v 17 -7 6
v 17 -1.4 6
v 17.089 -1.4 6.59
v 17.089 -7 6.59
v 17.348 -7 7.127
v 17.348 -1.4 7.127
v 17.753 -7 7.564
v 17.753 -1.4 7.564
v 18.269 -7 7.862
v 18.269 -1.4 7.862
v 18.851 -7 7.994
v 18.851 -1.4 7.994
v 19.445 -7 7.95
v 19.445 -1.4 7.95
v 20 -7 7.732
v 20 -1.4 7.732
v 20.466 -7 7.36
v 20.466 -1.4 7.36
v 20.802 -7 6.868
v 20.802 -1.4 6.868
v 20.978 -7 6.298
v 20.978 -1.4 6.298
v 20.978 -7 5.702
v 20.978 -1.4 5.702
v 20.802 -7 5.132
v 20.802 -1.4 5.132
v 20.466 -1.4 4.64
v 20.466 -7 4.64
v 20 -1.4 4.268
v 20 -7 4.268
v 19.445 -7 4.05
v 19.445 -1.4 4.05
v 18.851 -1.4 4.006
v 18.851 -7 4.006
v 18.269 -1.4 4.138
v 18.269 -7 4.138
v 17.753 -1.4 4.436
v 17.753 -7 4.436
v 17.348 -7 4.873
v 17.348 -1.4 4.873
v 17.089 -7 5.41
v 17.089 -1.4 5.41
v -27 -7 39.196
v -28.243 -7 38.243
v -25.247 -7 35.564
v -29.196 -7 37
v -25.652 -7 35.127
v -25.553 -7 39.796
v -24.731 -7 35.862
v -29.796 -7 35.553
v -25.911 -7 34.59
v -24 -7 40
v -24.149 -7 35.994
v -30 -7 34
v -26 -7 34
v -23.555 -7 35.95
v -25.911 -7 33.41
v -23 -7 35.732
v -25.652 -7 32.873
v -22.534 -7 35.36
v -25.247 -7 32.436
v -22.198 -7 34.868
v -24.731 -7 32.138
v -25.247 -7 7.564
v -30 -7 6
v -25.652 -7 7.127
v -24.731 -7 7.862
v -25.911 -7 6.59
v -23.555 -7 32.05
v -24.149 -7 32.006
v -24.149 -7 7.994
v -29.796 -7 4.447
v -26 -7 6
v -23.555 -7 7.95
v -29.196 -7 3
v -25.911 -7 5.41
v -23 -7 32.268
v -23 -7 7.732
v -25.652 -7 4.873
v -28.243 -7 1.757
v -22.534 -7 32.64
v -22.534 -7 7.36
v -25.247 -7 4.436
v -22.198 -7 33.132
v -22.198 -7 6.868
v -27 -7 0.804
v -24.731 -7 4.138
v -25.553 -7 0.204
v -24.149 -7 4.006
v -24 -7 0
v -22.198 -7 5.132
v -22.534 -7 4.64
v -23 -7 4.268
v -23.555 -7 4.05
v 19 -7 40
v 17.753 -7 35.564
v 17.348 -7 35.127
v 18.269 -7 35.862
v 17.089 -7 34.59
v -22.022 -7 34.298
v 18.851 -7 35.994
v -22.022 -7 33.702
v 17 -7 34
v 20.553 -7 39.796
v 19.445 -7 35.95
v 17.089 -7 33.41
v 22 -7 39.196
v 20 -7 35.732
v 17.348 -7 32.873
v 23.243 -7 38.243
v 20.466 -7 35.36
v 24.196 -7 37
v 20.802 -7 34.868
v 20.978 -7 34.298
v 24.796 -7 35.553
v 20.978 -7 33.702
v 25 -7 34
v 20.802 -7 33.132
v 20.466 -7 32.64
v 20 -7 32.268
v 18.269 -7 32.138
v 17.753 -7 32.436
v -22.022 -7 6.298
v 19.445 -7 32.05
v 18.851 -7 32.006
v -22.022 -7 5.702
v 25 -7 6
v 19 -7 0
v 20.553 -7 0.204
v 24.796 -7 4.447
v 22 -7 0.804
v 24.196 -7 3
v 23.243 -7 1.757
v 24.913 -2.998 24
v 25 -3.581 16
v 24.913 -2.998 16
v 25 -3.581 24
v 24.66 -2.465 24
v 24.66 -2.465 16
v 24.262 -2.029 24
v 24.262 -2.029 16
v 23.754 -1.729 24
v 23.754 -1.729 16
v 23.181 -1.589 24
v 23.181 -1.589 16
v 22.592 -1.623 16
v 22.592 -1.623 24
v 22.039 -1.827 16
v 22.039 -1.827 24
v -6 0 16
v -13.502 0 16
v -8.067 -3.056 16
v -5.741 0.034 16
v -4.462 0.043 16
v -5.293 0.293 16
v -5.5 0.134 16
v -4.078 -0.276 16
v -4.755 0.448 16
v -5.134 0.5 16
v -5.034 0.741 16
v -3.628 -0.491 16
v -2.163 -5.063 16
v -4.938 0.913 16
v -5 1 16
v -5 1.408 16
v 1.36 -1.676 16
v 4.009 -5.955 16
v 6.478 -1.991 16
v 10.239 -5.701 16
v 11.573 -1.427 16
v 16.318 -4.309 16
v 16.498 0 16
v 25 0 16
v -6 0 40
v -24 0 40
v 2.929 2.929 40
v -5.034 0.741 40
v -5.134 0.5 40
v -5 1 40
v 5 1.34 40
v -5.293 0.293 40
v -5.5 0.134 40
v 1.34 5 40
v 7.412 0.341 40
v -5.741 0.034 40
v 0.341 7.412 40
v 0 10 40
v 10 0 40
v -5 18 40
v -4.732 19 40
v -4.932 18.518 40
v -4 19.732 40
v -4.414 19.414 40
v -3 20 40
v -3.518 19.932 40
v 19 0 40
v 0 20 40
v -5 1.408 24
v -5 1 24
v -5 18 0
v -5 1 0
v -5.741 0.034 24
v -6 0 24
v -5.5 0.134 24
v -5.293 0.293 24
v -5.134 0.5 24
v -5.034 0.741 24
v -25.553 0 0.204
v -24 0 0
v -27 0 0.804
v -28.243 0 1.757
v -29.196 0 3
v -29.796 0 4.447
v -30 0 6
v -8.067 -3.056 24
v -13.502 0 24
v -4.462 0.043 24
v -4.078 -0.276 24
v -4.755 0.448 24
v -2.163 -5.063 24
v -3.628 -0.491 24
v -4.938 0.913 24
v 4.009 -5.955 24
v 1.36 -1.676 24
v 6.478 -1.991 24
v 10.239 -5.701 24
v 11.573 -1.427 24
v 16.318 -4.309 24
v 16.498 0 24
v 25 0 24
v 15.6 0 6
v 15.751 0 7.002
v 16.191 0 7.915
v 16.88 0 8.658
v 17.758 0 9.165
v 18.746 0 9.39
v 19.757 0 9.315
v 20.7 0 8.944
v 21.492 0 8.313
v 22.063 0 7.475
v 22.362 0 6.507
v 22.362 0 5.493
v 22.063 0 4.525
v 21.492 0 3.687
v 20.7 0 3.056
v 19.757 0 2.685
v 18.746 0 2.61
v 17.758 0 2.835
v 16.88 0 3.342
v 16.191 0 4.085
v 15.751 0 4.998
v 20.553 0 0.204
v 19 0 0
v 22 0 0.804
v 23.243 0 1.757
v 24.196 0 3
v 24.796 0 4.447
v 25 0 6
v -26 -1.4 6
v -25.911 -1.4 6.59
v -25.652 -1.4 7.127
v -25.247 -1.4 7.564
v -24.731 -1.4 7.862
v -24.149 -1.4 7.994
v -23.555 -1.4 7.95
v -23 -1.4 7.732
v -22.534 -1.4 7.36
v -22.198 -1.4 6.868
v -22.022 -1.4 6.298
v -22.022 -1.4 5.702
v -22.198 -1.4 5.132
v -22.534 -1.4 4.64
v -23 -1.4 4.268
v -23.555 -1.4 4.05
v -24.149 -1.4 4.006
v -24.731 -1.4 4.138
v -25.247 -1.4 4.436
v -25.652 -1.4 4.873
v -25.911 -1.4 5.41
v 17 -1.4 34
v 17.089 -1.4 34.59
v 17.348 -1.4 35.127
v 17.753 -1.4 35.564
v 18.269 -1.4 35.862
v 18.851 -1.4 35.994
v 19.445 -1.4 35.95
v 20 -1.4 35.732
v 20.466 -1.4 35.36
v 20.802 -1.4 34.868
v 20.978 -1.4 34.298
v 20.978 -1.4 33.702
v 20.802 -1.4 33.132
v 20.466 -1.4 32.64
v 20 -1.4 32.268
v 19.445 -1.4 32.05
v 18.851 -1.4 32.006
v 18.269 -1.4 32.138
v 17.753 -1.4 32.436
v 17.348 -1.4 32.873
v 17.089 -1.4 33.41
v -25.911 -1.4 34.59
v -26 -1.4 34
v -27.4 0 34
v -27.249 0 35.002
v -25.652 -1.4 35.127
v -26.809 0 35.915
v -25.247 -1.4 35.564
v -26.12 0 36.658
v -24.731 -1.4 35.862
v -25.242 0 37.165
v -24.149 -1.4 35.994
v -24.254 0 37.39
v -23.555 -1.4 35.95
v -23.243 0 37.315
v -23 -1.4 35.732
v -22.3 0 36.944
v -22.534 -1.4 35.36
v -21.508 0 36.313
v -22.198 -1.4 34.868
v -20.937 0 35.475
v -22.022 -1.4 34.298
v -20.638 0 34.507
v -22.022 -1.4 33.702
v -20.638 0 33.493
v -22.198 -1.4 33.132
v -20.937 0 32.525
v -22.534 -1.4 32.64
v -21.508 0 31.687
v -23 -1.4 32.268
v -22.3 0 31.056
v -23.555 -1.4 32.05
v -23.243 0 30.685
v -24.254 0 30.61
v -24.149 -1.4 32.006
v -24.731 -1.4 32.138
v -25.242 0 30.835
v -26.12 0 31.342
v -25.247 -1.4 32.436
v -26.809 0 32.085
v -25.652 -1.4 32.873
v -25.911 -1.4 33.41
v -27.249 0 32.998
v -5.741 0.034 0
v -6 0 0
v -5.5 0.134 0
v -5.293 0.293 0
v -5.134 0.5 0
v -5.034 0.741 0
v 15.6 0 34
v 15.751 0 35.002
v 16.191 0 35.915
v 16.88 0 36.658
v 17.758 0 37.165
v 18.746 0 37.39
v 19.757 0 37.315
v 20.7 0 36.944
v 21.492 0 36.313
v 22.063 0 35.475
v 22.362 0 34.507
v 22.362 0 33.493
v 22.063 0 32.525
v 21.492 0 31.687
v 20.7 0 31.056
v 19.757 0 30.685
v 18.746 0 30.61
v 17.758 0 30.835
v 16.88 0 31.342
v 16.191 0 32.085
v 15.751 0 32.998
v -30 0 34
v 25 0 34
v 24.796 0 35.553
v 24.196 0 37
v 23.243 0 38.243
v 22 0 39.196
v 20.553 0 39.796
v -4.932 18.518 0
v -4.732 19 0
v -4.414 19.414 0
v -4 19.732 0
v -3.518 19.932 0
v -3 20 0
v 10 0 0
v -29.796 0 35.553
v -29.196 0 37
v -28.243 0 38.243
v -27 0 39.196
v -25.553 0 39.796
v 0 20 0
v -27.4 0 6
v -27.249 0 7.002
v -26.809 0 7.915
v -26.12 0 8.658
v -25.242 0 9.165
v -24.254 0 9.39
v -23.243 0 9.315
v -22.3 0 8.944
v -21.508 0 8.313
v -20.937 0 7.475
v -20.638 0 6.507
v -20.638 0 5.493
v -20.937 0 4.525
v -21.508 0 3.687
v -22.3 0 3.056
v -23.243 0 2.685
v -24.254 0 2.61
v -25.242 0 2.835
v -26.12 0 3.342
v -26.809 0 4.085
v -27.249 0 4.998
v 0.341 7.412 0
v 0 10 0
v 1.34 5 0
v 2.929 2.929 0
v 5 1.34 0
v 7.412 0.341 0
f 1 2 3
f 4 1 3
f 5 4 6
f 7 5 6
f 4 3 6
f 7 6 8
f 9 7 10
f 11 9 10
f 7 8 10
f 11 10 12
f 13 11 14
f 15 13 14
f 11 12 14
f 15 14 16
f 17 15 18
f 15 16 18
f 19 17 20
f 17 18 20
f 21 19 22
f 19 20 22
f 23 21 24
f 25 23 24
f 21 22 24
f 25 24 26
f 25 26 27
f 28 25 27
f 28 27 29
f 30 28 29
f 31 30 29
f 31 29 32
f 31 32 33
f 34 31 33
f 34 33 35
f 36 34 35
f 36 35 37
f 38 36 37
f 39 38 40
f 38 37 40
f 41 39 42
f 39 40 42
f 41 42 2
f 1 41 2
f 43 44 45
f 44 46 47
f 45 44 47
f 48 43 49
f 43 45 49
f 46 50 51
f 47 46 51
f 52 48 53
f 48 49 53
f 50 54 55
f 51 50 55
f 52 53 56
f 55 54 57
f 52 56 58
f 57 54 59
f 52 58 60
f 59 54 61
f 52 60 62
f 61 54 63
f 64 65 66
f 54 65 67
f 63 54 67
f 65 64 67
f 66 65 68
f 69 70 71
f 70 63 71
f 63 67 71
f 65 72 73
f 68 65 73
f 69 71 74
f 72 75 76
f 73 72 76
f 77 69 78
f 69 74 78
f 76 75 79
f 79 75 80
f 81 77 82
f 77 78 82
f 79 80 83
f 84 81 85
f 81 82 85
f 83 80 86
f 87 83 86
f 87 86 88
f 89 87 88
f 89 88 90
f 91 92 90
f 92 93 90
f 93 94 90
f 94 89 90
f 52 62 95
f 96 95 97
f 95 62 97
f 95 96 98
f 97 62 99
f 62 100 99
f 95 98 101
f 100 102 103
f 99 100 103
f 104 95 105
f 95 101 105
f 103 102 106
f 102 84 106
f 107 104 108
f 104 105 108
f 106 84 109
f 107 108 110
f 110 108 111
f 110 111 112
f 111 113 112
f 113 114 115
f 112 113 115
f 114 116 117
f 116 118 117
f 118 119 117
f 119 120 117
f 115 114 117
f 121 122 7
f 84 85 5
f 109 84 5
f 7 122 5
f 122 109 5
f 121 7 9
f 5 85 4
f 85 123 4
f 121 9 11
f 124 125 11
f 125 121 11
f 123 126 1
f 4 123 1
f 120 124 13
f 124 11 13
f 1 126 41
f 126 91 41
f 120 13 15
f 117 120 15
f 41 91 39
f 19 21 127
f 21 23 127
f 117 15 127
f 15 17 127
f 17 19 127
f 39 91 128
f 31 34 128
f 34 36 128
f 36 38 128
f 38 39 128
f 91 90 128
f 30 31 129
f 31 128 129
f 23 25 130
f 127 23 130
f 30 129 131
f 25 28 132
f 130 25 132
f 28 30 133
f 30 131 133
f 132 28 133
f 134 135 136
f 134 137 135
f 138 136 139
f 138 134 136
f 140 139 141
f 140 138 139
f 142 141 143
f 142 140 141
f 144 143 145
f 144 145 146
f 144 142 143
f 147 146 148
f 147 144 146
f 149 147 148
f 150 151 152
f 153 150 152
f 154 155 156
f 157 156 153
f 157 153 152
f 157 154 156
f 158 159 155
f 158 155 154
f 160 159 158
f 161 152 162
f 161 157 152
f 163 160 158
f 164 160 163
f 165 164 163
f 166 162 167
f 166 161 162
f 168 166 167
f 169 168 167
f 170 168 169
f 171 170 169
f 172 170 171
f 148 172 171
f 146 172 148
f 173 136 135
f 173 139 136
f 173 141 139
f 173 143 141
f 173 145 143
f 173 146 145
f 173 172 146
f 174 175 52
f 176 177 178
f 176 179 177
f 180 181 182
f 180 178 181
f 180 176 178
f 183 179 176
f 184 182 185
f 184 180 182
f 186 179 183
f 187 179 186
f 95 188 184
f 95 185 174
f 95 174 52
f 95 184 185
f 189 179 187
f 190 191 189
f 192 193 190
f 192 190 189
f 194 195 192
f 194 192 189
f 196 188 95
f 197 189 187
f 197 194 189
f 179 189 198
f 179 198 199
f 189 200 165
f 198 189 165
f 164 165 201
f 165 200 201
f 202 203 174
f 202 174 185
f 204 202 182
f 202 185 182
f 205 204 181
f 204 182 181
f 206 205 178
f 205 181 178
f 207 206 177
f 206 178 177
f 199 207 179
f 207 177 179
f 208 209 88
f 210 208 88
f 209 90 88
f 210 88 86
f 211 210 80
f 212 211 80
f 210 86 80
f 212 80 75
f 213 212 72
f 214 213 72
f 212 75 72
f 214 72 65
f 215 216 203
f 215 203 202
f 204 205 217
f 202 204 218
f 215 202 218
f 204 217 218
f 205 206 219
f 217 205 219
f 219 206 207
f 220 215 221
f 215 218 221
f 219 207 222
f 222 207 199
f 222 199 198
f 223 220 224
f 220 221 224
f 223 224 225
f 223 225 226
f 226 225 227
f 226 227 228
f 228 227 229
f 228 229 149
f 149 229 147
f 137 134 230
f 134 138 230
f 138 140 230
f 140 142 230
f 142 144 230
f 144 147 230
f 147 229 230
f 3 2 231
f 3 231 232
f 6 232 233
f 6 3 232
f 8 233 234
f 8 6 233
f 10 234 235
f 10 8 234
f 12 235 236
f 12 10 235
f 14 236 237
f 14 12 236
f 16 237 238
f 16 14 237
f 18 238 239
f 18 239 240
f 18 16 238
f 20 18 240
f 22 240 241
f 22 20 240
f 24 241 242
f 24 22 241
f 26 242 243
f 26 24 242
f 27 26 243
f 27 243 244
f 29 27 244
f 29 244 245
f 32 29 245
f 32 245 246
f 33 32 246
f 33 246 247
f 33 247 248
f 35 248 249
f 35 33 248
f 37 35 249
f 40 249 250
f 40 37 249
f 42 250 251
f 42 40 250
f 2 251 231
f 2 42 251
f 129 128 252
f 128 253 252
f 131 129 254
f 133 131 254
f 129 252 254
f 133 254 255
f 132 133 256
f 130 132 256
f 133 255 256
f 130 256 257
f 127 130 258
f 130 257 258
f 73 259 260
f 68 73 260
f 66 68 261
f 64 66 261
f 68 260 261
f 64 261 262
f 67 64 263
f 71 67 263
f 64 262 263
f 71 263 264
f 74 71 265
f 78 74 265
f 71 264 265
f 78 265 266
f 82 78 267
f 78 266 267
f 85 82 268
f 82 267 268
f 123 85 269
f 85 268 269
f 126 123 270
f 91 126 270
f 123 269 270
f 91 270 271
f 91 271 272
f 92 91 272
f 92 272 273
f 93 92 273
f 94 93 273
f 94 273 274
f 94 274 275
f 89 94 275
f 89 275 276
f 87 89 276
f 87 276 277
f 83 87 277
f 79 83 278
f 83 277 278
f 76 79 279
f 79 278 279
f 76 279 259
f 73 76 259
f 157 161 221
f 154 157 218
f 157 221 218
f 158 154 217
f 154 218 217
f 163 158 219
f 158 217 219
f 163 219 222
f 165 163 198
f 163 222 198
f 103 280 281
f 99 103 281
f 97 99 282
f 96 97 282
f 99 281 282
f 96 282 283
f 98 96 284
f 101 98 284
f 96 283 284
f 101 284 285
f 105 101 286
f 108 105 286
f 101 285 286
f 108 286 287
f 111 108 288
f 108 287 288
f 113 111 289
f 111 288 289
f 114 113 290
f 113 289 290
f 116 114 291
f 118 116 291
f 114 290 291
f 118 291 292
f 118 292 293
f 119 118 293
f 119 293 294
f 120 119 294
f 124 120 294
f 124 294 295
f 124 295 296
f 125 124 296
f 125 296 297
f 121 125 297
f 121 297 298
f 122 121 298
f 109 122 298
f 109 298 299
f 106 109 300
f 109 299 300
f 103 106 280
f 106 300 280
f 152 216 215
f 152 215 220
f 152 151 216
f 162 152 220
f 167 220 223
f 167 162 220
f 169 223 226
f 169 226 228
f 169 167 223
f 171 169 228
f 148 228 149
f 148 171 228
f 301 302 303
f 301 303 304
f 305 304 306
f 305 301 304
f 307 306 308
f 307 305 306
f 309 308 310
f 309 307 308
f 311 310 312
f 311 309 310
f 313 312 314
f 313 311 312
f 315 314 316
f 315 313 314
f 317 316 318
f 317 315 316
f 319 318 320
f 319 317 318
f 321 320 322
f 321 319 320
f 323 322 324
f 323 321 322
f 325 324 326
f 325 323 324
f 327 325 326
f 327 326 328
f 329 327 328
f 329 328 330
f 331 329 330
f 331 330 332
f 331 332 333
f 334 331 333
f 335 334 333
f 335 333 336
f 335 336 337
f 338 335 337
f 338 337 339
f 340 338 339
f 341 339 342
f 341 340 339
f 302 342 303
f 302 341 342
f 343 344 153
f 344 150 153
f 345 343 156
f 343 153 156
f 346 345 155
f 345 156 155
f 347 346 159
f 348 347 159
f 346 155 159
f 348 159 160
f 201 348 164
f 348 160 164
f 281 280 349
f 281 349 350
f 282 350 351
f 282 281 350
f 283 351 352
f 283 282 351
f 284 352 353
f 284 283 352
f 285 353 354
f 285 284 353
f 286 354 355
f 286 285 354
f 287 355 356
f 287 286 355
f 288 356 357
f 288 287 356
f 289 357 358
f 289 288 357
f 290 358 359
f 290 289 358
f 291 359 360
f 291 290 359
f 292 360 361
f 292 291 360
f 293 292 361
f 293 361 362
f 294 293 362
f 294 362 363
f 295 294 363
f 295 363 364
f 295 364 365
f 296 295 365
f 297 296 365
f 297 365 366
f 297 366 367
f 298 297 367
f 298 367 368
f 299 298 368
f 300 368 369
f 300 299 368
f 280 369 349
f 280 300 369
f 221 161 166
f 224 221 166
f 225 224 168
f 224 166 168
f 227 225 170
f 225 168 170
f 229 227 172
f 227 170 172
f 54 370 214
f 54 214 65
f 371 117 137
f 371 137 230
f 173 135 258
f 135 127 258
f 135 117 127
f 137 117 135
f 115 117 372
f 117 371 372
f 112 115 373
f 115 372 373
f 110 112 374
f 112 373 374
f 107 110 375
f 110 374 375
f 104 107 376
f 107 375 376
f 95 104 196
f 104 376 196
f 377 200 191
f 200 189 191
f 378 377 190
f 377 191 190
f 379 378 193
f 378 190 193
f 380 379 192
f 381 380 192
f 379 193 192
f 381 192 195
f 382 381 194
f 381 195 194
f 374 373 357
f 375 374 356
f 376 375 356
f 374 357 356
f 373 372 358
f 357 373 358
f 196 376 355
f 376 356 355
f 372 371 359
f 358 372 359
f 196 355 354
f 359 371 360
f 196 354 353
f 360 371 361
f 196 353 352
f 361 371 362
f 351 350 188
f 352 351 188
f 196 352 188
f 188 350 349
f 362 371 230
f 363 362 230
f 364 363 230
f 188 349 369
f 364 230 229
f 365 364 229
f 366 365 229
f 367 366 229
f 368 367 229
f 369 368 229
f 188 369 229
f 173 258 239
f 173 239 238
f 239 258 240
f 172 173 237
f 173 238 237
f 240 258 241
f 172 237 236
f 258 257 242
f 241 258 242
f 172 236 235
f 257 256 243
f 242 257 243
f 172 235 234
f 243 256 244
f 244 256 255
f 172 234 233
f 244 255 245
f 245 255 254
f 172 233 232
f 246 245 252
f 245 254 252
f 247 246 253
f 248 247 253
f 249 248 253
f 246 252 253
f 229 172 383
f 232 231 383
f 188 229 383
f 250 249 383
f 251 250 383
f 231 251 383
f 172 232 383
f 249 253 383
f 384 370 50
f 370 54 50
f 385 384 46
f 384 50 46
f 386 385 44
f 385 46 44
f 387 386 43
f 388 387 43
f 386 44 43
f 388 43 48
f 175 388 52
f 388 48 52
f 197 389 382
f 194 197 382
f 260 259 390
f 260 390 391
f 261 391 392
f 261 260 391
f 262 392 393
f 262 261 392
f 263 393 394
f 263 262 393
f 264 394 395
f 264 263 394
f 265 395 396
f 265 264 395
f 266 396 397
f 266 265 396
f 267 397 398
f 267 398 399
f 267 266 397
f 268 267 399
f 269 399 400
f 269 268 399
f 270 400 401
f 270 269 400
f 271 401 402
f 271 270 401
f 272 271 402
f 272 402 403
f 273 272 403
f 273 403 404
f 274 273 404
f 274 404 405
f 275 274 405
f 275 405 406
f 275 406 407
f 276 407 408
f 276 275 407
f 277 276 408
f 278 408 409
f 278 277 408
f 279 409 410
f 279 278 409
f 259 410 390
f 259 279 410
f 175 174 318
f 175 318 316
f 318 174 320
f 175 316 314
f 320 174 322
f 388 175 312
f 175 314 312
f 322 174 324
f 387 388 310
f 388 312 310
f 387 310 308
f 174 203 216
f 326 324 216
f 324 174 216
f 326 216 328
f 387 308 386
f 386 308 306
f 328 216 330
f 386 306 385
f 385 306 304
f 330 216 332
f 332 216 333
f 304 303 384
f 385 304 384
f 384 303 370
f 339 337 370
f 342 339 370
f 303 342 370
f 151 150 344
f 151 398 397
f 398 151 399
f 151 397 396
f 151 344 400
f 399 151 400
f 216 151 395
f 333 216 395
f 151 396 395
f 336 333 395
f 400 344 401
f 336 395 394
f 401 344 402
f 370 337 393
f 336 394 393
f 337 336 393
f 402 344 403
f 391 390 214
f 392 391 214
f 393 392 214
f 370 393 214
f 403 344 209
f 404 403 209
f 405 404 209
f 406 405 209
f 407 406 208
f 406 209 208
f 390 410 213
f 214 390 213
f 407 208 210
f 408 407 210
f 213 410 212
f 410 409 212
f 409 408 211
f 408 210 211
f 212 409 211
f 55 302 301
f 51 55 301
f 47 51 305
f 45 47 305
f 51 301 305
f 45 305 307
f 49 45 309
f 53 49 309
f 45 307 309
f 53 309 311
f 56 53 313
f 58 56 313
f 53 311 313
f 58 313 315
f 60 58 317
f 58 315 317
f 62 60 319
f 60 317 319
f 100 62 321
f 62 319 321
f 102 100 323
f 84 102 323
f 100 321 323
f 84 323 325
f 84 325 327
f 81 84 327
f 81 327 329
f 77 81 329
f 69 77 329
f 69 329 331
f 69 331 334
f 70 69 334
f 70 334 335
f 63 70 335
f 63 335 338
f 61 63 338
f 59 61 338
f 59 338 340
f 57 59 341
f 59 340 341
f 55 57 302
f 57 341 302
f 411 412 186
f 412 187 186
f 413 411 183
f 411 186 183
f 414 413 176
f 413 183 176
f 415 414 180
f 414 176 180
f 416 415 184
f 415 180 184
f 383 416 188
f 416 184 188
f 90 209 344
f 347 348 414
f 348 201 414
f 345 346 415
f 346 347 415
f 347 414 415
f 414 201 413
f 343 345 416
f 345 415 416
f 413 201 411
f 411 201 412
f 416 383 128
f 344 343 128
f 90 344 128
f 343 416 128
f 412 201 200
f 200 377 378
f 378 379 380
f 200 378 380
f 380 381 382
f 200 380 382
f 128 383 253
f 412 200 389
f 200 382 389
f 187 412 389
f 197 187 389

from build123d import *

# Parameters (mm, degrees)
BOSS_EXTRUDE1_DEPTH     = 40
CUT_EXTRUDE1_DEPTH      = 4
CUT_EXTRUDE1_DEPTH_BACK = 4
CUT_EXTRUDE1_START      = -20
SKETCH3_R               = 33.884102156
SKETCH3_R_2             = 29.884102156
FILLET1_R               = 2
FILLET2_R               = 2
FILLET3_R               = 2
SKETCH4_R               = 2
CUT_EXTRUDE2_DEPTH      = 7
CHAMFER1_SIZE           = 1.4
FILLET4_R               = 1
FILLET5_R               = 10
FILLET6_R               = 6


with BuildPart() as part:
    # Sketch1 → Boss-Extrude1 (new body)
    with BuildSketch(Plane.XY):
        Polygon((0, 0), (0, 20), (-5, 20), (-5, 0), (-30, 0), (-30, -7), (25, -7), (25, 0), align=None)
    extrude(amount=BOSS_EXTRUDE1_DEPTH)

    # Sketch3 → Cut-Extrude1 (cut, two sides: drawn at the far end of the back side and taken through both)
    with BuildSketch(Plane.XY.offset(40).offset(CUT_EXTRUDE1_START - CUT_EXTRUDE1_DEPTH_BACK)):
        with Locations((5.748786379, 27.884102156)):
            Circle(SKETCH3_R)
        with Locations((5.748786379, 27.884102156)):
            Circle(SKETCH3_R_2, mode=Mode.SUBTRACT)
    extrude(amount=CUT_EXTRUDE1_DEPTH + CUT_EXTRUDE1_DEPTH_BACK, mode=Mode.SUBTRACT)

    # Fillet1
    fillet1_edges = [part.edges().sort_by_distance(p)[0] for p in [
        (-5, 0, 20),
    ]]
    fillet(fillet1_edges, radius=FILLET1_R)

    # Fillet2
    fillet2_edges = [part.edges().sort_by_distance(p)[0] for p in [
        (-5, 20, 20),
    ]]
    fillet(fillet2_edges, radius=FILLET2_R)

    # Fillet3
    fillet3_edges = [part.edges().sort_by_distance(p)[0] for p in [
        (25, 0, 20),
    ]]
    fillet(fillet3_edges, radius=FILLET3_R)

    # Sketch4 → Cut-Extrude2 (cut)
    with BuildSketch(Plane(origin=(0, 0, 0), x_dir=(1, 0, 0), z_dir=(0, 1, 0))):
        with Locations(Location((-24, -6, 0), (0, 0, 180))):
            Circle(SKETCH4_R)
        with Locations(Location((-24, -34, 0), (0, 0, 180))):
            Circle(SKETCH4_R)
        with Locations(Location((19, -34, 0), (0, 0, 180))):
            Circle(SKETCH4_R)
        with Locations(Location((19, -6, 0), (0, 0, 180))):
            Circle(SKETCH4_R)
    extrude(amount=-CUT_EXTRUDE2_DEPTH, mode=Mode.SUBTRACT)

    # Chamfer1
    chamfer1_edges = [part.edges().sort_by_distance(p)[0] for p in [
        (21, 0, 6),
        (21, 0, 34),
        (-22, 0, 34),
        (-22, 0, 6),
    ]]
    chamfer(chamfer1_edges, length=CHAMFER1_SIZE)

    # Fillet4
    fillet4_edges = [part.edges().sort_by_distance(p)[0] for p in [
        (-5, 0, 32),
        (-5, 0, 8),
    ]]
    fillet(fillet4_edges, radius=FILLET4_R)

    # Fillet5
    fillet5_edges = [part.edges().sort_by_distance(p)[0] for p in [
        (0, 0, 20),
    ]]
    fillet(fillet5_edges, radius=FILLET5_R)

    # Fillet6
    fillet6_edges = [part.edges().sort_by_distance(p)[0] for p in [
        (-30, -3.5, 40),
        (25, -3.5, 40),
        (25, -3.5, 0),
        (-30, -3.5, 0),
    ]]
    fillet(fillet6_edges, radius=FILLET6_R)


solid = part.part
